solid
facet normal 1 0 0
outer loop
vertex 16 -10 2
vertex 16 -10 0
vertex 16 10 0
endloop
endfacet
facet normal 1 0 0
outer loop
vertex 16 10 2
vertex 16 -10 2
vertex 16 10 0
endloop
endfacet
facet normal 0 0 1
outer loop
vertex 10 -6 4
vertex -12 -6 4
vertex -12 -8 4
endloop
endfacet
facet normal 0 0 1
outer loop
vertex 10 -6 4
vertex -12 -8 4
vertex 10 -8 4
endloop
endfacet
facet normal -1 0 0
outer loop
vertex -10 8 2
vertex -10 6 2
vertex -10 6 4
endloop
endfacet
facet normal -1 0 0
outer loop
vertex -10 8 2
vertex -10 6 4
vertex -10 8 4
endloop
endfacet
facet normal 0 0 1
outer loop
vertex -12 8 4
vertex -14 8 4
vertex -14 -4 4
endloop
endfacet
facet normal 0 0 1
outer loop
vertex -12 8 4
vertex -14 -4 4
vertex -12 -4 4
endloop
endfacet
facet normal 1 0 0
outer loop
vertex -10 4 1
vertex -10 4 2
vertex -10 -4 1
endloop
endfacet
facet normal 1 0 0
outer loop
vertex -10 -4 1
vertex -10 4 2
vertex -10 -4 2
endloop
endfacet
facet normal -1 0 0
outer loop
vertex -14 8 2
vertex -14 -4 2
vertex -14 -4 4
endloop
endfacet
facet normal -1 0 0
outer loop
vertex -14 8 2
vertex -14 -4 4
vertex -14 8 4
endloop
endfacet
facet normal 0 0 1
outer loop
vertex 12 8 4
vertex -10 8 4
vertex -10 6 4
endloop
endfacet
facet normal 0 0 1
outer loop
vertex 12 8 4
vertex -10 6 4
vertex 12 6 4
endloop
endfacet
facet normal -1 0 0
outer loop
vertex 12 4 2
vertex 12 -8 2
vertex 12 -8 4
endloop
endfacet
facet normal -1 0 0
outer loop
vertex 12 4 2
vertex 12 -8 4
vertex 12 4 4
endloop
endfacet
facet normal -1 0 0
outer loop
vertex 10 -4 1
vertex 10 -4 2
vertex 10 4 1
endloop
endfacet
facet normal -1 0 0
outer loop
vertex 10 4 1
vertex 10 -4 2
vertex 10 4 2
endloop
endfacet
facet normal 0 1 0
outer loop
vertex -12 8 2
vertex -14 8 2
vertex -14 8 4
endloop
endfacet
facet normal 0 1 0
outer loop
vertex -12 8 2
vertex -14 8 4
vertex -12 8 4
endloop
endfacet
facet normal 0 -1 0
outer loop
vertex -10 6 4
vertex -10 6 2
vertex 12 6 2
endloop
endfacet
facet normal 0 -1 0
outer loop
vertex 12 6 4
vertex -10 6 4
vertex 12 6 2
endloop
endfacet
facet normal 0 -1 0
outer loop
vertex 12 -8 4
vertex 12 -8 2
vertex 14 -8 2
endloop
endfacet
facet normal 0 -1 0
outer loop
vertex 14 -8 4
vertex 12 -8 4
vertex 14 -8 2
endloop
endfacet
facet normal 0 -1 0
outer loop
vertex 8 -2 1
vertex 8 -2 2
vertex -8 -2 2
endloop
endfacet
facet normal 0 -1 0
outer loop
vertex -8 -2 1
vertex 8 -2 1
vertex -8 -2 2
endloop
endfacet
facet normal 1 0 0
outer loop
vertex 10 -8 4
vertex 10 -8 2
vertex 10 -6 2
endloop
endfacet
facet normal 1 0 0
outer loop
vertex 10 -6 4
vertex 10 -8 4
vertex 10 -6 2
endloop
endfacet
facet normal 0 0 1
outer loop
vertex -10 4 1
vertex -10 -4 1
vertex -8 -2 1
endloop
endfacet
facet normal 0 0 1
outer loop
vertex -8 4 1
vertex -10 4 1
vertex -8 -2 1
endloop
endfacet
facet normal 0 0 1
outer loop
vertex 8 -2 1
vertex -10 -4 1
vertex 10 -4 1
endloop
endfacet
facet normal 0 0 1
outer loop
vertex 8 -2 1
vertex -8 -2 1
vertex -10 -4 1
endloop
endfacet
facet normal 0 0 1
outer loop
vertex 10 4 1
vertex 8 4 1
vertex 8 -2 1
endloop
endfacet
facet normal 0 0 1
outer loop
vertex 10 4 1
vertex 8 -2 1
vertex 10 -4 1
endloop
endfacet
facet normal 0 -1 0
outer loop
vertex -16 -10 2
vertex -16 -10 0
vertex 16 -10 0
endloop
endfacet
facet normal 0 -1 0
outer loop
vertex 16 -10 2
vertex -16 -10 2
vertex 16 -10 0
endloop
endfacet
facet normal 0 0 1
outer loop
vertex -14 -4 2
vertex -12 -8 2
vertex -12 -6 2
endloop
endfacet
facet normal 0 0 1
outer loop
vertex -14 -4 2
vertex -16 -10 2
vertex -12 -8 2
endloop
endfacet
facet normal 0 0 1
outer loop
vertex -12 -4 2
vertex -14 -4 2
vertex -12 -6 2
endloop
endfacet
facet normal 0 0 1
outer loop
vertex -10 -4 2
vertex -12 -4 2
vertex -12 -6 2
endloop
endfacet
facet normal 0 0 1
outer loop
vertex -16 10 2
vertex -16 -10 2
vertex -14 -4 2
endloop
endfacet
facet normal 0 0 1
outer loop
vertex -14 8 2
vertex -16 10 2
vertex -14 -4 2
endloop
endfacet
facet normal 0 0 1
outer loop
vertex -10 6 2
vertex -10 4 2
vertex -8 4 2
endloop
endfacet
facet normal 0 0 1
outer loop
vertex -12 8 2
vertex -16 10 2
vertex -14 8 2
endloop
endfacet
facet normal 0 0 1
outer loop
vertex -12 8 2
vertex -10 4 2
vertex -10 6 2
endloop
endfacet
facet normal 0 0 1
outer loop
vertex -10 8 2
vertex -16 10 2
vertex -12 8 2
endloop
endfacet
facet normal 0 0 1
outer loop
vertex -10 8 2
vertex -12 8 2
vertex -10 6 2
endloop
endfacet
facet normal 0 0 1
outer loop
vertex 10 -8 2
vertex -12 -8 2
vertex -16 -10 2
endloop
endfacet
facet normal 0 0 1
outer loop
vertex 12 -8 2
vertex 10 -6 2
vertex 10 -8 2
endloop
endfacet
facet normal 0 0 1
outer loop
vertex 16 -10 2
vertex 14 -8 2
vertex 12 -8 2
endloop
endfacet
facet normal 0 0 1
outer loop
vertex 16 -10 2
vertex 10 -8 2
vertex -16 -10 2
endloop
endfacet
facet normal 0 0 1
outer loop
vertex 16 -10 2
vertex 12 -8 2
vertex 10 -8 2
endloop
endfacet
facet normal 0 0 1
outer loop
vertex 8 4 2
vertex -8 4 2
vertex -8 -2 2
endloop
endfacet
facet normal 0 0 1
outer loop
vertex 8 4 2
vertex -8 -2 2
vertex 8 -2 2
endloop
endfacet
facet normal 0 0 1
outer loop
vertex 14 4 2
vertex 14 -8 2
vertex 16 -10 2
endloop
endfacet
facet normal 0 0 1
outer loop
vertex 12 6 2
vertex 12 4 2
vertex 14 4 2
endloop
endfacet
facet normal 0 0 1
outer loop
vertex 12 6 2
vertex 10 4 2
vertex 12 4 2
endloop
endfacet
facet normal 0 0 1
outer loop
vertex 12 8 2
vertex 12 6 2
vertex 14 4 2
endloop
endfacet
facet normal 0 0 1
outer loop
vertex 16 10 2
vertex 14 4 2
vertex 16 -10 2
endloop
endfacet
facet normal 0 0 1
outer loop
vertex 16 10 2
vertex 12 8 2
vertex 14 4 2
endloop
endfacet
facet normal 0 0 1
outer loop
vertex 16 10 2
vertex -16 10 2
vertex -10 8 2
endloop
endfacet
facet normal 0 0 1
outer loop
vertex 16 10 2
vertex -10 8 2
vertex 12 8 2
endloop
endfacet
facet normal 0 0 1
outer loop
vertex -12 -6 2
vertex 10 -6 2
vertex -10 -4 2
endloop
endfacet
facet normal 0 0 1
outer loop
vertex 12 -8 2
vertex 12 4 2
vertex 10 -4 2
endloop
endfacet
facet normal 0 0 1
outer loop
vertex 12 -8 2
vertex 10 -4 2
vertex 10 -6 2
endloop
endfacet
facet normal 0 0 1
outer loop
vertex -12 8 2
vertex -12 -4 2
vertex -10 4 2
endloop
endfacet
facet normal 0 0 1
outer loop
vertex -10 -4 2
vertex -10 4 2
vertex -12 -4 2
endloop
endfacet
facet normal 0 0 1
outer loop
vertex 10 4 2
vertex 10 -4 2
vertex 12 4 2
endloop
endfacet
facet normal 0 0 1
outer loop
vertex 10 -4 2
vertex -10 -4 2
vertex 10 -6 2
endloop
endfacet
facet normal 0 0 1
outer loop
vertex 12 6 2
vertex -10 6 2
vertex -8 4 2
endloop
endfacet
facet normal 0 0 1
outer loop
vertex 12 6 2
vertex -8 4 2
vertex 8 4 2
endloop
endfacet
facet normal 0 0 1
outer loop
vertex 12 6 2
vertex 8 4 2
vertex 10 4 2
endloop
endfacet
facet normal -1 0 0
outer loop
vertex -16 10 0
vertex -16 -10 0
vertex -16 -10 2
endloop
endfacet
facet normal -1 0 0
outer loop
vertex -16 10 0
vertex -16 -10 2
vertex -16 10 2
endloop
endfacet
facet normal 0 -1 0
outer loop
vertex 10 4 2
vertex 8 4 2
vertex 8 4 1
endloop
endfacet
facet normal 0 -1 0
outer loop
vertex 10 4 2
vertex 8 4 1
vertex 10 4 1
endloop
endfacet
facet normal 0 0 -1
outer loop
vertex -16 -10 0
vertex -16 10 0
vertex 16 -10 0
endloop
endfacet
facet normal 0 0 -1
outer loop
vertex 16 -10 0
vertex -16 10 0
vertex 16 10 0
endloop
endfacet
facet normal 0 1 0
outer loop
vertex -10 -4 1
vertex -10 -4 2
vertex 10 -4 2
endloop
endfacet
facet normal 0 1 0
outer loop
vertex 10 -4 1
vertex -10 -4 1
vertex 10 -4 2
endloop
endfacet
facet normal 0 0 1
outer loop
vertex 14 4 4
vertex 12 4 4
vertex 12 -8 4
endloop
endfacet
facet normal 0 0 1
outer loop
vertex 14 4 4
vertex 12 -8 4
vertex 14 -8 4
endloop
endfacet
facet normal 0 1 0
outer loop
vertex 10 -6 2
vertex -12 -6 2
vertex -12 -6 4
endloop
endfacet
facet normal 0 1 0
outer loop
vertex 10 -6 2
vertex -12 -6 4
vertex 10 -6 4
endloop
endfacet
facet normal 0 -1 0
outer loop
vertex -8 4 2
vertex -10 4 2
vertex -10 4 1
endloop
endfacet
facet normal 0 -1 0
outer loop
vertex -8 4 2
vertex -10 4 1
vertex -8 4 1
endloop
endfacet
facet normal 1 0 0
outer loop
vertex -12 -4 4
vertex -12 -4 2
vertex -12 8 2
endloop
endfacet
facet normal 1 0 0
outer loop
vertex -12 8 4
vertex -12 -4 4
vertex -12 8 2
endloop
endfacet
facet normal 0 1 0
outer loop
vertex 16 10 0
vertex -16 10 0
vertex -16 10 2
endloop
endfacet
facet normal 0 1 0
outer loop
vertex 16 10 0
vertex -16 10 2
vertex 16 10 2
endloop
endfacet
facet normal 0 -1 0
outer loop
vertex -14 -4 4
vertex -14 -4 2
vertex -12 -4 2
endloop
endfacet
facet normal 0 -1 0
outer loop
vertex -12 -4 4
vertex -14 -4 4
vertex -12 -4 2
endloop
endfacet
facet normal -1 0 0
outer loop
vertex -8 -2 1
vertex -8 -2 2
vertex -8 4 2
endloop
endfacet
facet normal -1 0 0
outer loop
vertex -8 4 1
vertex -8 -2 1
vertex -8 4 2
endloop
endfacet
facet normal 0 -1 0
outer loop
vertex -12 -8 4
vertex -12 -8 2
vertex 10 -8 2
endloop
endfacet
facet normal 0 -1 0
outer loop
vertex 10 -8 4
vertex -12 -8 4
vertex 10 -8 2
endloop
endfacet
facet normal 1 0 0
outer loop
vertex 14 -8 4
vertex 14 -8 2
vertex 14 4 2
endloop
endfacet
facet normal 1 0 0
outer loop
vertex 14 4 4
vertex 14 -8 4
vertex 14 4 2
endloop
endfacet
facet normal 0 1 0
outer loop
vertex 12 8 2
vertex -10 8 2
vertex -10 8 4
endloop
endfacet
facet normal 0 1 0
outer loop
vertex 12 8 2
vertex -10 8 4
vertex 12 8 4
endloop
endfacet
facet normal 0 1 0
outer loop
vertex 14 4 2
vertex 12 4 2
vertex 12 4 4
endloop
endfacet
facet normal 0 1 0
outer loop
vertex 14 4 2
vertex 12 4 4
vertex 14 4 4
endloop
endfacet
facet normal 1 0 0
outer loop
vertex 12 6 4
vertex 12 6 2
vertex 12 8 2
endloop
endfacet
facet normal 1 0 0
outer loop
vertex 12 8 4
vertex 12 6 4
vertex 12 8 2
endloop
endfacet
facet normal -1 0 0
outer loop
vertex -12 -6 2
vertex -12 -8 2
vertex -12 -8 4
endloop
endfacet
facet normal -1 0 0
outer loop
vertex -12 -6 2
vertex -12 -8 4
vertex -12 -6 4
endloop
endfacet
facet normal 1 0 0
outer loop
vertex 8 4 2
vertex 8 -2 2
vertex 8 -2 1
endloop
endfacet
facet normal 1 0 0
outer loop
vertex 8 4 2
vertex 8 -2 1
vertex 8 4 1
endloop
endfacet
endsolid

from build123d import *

# Parameters (mm, degrees)
F1_W     = 32
F1_H     = 20
F2_DEPTH = 2
F3_W     = 2
F3_H     = 12
F3_W_2   = 22
F3_H_2   = 2
F4_DEPTH = 2
F5_W     = 2
F5_H     = 6
F6_DEPTH = 1


with BuildPart() as f2:
    # F1 (on Top) → F2 (new body)
    with BuildSketch(Plane.XY):
        Rectangle(F1_W, F1_H)
    extrude(amount=F2_DEPTH)

    # F3 (on face) → F4 (join)
    with BuildSketch(Plane.XY.offset(2)):
        with Locations((-13, 2)):
            Rectangle(F3_W, F3_H)
        with Locations((1, 7)):
            Rectangle(F3_W_2, F3_H_2)
        with Locations((13, -2)):
            Rectangle(F3_W, F3_H)
        with Locations((-1, -7)):
            Rectangle(F3_W_2, F3_H_2)
    extrude(amount=F4_DEPTH)

    # F5 (on face) → F6 (cut)
    with BuildSketch(Plane.XY.offset(2)):
        with Locations((-9, 1)):
            Rectangle(F5_W, F5_H)
        Polygon((-10, -2), (-10, -4), (10, -4), (10, -2), (8, -2), (-8, -2), align=None)
        with Locations((9, 1)):
            Rectangle(F5_W, F5_H)
    extrude(amount=-F6_DEPTH, mode=Mode.SUBTRACT)


solid = f2.part
